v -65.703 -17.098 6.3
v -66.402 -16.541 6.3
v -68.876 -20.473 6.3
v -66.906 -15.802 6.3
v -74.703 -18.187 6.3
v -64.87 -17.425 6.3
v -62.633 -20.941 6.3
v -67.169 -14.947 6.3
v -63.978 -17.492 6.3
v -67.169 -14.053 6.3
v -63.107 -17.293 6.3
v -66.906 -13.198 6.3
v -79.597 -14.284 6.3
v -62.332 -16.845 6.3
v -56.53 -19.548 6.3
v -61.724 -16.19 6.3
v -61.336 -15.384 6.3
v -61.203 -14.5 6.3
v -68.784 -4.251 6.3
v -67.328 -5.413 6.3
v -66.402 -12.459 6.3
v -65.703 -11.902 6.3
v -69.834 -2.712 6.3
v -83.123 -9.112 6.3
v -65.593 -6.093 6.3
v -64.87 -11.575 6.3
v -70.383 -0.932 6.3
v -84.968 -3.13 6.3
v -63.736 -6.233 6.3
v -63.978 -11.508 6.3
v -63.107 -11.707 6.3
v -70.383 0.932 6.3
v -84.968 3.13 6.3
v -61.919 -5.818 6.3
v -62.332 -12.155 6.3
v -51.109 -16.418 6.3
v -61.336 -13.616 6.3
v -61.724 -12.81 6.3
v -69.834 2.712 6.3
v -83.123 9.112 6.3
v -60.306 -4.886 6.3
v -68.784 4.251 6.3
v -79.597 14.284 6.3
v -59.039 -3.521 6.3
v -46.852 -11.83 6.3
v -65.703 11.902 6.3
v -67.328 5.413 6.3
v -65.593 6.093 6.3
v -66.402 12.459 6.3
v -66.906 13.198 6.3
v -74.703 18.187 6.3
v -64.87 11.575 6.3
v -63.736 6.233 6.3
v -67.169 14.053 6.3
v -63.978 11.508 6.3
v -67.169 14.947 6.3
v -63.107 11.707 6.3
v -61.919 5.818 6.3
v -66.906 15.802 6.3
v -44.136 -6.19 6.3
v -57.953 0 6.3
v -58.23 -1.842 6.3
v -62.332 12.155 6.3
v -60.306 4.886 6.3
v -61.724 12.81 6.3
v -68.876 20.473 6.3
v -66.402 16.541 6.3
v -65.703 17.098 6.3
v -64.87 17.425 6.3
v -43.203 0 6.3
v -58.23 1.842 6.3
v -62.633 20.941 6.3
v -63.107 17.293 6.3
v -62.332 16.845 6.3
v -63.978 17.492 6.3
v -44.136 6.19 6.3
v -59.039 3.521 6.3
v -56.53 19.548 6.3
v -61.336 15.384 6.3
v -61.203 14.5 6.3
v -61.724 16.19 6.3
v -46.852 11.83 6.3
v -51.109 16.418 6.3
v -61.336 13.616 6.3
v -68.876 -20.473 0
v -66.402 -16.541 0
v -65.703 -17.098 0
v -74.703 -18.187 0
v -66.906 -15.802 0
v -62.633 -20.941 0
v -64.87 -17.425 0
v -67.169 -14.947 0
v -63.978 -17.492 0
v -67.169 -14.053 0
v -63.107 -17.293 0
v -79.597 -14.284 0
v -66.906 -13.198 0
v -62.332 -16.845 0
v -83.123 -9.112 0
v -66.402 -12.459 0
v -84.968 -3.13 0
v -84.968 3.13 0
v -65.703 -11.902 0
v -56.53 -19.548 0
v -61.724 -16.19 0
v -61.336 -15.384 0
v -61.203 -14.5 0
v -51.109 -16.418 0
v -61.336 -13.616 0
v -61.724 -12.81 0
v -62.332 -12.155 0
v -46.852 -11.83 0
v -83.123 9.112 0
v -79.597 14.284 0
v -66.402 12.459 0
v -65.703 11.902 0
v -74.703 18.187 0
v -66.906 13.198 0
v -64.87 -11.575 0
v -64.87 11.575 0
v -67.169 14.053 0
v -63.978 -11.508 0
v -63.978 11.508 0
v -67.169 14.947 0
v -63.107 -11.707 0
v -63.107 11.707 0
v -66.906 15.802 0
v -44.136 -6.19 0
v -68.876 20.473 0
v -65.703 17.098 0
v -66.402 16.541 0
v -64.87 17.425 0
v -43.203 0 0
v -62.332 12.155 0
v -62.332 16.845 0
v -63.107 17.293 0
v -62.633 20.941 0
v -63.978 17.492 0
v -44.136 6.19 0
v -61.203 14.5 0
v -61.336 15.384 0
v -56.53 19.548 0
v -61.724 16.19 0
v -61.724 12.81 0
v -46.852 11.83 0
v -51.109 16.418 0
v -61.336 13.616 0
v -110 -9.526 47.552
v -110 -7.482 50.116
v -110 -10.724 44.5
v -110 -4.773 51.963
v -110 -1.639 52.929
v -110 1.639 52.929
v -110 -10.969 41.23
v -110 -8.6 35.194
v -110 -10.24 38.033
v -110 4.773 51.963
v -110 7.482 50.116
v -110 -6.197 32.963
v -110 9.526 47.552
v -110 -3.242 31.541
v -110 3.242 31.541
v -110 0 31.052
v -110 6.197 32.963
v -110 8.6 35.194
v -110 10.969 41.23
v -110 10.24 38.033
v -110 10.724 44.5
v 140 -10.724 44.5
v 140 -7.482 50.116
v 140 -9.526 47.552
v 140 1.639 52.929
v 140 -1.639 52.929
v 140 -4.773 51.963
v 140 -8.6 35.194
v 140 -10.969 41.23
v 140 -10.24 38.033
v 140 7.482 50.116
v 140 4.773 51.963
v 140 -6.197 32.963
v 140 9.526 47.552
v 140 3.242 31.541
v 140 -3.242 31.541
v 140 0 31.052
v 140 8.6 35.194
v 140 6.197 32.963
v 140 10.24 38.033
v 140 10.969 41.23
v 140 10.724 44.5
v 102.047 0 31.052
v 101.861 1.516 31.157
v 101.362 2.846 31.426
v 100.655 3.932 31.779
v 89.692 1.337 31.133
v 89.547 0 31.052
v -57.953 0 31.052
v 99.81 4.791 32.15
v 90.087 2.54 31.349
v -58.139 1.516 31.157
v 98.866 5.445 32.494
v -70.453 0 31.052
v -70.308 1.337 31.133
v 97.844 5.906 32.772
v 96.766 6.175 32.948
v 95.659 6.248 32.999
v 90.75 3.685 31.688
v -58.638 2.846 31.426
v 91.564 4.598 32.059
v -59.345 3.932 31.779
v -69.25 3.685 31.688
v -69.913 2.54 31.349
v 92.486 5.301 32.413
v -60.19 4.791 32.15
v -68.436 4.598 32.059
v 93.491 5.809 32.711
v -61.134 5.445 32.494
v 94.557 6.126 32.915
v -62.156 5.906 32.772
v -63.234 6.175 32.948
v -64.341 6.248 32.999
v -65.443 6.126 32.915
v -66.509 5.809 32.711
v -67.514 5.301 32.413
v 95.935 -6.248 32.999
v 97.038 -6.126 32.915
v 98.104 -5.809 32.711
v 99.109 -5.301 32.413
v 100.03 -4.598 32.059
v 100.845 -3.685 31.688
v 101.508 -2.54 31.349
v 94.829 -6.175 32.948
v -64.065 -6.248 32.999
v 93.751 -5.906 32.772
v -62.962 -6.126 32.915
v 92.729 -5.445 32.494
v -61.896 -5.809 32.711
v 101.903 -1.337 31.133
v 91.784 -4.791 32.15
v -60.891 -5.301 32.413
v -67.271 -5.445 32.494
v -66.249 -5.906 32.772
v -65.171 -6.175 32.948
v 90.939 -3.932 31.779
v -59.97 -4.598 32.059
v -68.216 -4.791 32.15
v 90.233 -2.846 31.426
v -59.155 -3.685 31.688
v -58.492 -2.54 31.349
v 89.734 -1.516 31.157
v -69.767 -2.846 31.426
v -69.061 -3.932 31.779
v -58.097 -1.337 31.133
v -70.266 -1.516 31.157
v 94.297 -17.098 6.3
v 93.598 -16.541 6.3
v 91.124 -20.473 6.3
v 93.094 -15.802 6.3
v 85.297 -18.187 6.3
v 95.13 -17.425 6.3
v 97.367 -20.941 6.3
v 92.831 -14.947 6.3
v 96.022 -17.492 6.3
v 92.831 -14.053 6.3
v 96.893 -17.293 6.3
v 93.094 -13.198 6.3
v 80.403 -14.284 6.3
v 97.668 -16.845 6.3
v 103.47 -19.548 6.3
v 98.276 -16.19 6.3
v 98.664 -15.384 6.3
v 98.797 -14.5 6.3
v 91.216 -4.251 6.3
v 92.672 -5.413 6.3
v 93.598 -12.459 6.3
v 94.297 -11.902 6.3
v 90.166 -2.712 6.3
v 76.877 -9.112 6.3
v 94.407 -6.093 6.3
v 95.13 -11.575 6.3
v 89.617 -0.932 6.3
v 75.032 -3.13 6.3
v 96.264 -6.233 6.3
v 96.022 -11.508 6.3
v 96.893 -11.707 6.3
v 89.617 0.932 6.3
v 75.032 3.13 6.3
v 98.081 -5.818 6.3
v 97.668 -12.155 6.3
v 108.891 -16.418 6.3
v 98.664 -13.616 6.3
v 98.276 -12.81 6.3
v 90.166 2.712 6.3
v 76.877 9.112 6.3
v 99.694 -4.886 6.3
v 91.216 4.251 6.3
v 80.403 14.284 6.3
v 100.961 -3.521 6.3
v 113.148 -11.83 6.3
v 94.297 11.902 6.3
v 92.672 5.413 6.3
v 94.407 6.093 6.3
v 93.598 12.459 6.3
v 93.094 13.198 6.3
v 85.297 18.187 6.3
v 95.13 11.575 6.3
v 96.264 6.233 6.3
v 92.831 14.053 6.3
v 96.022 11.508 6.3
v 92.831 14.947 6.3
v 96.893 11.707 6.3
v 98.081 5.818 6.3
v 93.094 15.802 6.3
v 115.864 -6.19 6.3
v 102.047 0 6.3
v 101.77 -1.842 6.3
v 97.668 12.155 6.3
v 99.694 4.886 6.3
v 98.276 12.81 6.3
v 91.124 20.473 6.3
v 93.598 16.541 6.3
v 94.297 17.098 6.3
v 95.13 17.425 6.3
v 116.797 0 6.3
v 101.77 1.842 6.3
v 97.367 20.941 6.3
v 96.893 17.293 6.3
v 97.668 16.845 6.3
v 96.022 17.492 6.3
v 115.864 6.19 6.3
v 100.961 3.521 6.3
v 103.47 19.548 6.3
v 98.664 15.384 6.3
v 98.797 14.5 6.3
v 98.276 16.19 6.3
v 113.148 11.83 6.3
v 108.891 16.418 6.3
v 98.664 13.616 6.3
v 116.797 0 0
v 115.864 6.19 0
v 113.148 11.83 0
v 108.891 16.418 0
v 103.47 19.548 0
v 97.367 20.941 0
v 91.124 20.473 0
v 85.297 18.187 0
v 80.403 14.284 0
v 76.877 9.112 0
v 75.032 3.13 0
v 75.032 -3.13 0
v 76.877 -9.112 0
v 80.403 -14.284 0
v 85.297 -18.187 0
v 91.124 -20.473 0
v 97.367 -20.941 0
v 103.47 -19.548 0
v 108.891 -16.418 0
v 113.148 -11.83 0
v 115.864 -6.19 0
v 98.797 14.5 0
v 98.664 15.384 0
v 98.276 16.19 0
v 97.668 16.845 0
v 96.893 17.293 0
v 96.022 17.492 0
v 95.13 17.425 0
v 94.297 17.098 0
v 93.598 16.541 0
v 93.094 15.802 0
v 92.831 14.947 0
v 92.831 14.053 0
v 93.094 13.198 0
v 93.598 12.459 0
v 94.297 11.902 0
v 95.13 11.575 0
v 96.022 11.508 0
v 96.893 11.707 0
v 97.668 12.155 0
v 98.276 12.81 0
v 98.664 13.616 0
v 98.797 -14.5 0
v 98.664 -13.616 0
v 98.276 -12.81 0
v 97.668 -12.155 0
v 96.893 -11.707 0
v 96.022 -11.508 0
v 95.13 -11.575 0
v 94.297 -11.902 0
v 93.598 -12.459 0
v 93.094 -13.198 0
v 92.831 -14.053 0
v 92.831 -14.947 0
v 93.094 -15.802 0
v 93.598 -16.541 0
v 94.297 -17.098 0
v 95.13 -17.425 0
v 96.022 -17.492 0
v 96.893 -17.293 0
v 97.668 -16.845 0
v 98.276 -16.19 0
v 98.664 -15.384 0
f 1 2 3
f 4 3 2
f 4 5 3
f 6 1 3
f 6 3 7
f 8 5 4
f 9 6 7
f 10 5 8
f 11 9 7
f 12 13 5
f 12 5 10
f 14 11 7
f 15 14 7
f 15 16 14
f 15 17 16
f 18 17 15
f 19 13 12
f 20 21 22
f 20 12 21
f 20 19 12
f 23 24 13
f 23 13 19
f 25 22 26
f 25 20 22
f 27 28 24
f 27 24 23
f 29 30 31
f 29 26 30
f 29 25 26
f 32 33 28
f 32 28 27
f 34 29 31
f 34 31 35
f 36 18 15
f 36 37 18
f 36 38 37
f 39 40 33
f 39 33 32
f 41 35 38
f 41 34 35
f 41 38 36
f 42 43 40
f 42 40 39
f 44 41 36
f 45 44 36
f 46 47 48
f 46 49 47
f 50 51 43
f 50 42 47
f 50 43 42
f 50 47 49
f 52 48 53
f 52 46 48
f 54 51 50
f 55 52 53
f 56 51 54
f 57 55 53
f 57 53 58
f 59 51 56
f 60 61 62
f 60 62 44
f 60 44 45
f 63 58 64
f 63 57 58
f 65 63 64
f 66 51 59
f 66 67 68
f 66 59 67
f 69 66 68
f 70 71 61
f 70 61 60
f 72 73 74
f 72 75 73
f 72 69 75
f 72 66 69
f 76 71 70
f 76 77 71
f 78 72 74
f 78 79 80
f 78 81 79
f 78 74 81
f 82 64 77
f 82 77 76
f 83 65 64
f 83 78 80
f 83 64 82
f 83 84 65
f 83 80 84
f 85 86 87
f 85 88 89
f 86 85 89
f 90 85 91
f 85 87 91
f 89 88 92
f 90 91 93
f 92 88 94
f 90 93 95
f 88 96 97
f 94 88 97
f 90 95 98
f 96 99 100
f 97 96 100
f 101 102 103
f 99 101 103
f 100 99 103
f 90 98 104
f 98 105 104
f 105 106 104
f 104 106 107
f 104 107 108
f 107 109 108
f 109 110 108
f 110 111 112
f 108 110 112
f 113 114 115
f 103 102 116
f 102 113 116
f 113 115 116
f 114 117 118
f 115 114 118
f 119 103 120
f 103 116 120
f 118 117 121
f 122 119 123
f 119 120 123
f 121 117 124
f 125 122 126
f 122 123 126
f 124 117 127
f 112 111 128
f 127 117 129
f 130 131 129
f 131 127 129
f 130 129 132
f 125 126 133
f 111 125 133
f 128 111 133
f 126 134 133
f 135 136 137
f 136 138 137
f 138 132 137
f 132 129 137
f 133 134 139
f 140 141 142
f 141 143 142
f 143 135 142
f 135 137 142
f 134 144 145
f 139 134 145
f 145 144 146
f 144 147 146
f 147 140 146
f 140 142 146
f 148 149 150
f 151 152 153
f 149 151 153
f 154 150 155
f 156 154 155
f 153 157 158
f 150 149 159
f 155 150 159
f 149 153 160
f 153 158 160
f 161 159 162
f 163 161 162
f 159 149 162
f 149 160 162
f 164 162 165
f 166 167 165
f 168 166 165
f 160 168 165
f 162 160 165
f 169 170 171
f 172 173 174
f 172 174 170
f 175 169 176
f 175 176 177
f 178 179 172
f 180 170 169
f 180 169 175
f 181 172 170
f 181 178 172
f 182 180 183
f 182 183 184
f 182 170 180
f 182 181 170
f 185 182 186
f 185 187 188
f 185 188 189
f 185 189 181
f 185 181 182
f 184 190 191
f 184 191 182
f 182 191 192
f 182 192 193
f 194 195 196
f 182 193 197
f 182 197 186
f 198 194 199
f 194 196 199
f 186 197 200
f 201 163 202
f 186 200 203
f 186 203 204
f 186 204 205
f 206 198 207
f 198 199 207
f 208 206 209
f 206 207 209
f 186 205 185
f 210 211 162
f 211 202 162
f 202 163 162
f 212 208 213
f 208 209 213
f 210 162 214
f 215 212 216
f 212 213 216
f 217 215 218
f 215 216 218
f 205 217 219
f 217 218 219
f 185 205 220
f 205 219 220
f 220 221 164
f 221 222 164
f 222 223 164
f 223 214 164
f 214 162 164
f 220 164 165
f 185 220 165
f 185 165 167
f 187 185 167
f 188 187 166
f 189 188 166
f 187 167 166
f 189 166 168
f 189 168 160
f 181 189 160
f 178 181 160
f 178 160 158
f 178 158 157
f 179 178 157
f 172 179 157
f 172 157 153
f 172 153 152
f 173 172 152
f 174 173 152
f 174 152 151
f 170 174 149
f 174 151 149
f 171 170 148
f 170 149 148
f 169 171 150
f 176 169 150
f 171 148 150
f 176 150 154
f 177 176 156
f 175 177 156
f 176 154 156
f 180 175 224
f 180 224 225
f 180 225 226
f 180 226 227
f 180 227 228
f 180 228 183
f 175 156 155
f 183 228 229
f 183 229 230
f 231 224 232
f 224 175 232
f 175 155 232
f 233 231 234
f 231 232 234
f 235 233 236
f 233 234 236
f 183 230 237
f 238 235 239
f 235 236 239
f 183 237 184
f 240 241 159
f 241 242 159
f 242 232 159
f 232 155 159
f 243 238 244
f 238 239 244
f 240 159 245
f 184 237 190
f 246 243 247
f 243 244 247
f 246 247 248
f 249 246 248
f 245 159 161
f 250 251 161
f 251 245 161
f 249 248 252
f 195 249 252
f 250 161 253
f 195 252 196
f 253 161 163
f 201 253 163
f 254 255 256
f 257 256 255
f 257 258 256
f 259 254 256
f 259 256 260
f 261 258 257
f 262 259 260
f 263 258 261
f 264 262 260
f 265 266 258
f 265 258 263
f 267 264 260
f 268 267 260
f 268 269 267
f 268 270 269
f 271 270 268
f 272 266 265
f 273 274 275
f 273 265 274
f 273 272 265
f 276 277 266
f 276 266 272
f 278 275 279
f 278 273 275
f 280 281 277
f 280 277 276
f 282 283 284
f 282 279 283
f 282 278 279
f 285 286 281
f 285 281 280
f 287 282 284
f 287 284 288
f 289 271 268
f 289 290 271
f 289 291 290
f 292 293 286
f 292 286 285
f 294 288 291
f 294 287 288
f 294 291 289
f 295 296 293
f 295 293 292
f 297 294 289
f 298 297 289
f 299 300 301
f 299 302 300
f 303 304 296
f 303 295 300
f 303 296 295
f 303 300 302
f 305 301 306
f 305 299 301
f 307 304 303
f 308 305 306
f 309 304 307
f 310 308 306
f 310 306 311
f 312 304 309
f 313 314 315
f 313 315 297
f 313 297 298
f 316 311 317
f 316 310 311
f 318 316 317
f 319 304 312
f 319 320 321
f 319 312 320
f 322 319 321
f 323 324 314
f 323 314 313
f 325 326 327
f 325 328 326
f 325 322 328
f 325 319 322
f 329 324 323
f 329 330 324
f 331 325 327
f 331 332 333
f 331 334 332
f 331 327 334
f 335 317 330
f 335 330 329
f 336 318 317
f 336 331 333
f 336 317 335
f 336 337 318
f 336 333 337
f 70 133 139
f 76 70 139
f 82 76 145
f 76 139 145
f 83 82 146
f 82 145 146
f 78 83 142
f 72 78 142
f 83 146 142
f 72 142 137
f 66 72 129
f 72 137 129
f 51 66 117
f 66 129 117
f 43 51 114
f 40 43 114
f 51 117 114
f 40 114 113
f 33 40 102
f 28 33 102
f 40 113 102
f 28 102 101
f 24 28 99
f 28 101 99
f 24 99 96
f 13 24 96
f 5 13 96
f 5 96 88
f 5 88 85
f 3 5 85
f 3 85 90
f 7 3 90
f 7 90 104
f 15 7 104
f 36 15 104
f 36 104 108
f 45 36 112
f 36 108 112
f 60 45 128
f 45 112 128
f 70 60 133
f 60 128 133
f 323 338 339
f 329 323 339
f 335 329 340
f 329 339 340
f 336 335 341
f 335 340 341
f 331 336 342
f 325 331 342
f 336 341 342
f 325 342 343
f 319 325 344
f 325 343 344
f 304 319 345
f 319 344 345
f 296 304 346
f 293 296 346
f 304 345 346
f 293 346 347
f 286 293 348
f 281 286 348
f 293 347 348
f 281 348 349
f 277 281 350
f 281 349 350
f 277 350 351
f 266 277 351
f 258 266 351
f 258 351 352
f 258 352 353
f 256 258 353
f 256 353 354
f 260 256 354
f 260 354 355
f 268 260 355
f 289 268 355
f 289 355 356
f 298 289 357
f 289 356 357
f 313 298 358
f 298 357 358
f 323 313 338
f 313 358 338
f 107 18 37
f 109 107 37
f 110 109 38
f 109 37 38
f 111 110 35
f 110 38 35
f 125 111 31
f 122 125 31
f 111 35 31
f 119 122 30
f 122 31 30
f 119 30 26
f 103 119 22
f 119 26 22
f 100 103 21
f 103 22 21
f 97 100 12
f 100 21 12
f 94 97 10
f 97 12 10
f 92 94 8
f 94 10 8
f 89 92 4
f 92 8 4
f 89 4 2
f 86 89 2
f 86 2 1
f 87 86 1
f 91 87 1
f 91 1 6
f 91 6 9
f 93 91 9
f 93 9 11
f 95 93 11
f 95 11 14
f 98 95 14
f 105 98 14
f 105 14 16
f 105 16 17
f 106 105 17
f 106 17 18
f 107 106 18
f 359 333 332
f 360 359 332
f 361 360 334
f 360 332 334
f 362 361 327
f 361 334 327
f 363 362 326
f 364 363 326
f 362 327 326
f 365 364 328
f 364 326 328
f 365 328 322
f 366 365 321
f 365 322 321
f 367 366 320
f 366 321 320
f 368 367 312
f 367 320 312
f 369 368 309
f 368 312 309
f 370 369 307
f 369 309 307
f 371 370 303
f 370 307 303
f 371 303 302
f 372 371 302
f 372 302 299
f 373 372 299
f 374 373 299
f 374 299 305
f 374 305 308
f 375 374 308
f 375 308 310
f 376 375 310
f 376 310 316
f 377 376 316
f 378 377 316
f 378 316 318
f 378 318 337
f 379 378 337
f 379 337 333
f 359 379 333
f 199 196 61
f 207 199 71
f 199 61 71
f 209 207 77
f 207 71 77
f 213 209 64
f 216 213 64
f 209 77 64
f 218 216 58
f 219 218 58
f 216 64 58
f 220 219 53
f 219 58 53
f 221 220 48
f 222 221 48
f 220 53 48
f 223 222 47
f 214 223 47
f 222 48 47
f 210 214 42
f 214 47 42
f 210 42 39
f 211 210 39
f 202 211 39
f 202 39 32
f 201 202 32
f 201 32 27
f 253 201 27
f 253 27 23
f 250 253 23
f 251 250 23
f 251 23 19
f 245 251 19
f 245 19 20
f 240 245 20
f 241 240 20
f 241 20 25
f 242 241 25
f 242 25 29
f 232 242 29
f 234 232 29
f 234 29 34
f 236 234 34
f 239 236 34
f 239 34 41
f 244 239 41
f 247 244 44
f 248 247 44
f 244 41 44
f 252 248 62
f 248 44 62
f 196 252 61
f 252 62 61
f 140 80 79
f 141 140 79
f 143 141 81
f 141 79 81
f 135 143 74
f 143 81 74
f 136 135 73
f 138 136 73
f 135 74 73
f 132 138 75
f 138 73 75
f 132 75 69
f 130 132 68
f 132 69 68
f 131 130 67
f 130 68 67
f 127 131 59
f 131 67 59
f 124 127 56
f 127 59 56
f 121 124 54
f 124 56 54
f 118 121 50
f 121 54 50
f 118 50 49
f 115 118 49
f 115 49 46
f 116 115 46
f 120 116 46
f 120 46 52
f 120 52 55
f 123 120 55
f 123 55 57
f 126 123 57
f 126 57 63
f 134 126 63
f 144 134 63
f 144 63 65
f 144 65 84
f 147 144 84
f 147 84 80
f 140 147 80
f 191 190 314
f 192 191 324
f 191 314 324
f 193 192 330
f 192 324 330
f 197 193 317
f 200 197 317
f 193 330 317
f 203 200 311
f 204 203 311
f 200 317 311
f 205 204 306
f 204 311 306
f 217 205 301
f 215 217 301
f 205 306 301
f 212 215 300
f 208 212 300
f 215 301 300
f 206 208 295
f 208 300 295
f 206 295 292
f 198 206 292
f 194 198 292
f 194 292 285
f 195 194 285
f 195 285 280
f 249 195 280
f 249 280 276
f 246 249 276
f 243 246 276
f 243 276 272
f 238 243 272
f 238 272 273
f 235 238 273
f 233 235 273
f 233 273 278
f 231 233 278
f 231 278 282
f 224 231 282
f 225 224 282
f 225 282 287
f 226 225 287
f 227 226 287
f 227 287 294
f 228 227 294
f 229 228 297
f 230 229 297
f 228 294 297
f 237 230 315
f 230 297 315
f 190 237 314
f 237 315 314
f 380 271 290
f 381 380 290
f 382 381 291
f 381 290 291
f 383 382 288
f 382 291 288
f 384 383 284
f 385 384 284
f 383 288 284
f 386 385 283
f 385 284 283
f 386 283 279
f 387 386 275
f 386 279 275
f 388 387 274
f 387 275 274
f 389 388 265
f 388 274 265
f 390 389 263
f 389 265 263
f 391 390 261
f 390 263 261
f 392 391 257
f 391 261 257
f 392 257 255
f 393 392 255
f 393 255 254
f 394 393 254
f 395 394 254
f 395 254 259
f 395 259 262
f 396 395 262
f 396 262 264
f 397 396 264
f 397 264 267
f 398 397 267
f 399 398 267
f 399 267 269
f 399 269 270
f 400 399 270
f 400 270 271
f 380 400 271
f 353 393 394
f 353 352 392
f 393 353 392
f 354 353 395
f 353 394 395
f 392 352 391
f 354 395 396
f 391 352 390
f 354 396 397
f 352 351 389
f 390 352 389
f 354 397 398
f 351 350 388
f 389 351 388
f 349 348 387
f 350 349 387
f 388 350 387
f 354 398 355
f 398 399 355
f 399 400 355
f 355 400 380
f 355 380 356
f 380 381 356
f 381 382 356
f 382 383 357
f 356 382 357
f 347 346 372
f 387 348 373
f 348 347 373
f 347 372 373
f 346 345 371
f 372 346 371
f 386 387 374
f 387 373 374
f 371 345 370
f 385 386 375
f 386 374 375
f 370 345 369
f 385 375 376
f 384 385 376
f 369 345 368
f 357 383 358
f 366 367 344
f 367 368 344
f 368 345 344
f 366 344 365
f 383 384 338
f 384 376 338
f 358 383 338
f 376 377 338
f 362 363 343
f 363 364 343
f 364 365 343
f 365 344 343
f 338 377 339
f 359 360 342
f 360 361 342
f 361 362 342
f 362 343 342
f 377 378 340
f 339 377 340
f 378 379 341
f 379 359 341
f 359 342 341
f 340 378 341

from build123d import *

# Parameters (mm, degrees)
SKETCH_1_R           = 21
EXTRUDE_3_DEPTH      = 6.3
EXTRUDE_3_2_DEPTH    = 6.3
SKETCH_3_R           = 6.25
EXTRUDE_4_DEPTH      = 33
EXTRUDE_5_DEPTH      = 140
EXTRUDE_5_DEPTH_BACK = 110
SKETCH_4_R           = 11
SKETCH_5_R           = 3
CUT_EXTRUDE_1_DEPTH  = 10


with BuildPart() as part:
    # 草圖1 → 填料-伸長3 (new body)
    with BuildSketch(Plane.XY):
        with Locations((-64.202643172, 0)):
            Circle(SKETCH_1_R)
    extrude(amount=EXTRUDE_3_DEPTH)



with BuildPart() as body_2:
    # 草圖1 → Extrude 3 2 (new body)
    with BuildSketch(Plane.XY):
        with Locations((95.797356828, 0)):
            Circle(SKETCH_1_R)
    extrude(amount=EXTRUDE_3_2_DEPTH)


with BuildPart() as part_1:
    add(part.part)

    add(body_2.part)  # 填料-伸長4 merges body 2
    # 草圖3 → 填料-伸長4 (add)
    with BuildSketch(Plane.XY):
        with Locations((-64.202643172, 0)):
            Circle(SKETCH_3_R)
        with Locations((95.797356828, 0)):
            Circle(SKETCH_3_R)
    extrude(amount=EXTRUDE_4_DEPTH)

    # 草圖4 → 填料-伸長5 (add, two sides: drawn at the far end of the back side and taken through both)
    with BuildSketch(Plane(origin=(0, 0, 0), x_dir=(0, 0, -1), z_dir=(1, 0, 0)).offset(-EXTRUDE_5_DEPTH_BACK)):
        with Locations((-42.051933495, 0)):
            Circle(SKETCH_4_R)
    extrude(amount=EXTRUDE_5_DEPTH + EXTRUDE_5_DEPTH_BACK)

    # 草圖5 → 除料-伸長1 (cut)
    with BuildSketch(Plane.XY.offset(6.3)):
        with Locations((-64.202643172, 14.5)):
            Circle(SKETCH_5_R)
        with Locations((-64.202643172, -14.5)):
            Circle(SKETCH_5_R)
        with Locations((95.797356828, 14.5)):
            Circle(SKETCH_5_R)
        with Locations((95.797356828, -14.5)):
            Circle(SKETCH_5_R)
    extrude(amount=-CUT_EXTRUDE_1_DEPTH, mode=Mode.SUBTRACT)


solid = part_1.part
